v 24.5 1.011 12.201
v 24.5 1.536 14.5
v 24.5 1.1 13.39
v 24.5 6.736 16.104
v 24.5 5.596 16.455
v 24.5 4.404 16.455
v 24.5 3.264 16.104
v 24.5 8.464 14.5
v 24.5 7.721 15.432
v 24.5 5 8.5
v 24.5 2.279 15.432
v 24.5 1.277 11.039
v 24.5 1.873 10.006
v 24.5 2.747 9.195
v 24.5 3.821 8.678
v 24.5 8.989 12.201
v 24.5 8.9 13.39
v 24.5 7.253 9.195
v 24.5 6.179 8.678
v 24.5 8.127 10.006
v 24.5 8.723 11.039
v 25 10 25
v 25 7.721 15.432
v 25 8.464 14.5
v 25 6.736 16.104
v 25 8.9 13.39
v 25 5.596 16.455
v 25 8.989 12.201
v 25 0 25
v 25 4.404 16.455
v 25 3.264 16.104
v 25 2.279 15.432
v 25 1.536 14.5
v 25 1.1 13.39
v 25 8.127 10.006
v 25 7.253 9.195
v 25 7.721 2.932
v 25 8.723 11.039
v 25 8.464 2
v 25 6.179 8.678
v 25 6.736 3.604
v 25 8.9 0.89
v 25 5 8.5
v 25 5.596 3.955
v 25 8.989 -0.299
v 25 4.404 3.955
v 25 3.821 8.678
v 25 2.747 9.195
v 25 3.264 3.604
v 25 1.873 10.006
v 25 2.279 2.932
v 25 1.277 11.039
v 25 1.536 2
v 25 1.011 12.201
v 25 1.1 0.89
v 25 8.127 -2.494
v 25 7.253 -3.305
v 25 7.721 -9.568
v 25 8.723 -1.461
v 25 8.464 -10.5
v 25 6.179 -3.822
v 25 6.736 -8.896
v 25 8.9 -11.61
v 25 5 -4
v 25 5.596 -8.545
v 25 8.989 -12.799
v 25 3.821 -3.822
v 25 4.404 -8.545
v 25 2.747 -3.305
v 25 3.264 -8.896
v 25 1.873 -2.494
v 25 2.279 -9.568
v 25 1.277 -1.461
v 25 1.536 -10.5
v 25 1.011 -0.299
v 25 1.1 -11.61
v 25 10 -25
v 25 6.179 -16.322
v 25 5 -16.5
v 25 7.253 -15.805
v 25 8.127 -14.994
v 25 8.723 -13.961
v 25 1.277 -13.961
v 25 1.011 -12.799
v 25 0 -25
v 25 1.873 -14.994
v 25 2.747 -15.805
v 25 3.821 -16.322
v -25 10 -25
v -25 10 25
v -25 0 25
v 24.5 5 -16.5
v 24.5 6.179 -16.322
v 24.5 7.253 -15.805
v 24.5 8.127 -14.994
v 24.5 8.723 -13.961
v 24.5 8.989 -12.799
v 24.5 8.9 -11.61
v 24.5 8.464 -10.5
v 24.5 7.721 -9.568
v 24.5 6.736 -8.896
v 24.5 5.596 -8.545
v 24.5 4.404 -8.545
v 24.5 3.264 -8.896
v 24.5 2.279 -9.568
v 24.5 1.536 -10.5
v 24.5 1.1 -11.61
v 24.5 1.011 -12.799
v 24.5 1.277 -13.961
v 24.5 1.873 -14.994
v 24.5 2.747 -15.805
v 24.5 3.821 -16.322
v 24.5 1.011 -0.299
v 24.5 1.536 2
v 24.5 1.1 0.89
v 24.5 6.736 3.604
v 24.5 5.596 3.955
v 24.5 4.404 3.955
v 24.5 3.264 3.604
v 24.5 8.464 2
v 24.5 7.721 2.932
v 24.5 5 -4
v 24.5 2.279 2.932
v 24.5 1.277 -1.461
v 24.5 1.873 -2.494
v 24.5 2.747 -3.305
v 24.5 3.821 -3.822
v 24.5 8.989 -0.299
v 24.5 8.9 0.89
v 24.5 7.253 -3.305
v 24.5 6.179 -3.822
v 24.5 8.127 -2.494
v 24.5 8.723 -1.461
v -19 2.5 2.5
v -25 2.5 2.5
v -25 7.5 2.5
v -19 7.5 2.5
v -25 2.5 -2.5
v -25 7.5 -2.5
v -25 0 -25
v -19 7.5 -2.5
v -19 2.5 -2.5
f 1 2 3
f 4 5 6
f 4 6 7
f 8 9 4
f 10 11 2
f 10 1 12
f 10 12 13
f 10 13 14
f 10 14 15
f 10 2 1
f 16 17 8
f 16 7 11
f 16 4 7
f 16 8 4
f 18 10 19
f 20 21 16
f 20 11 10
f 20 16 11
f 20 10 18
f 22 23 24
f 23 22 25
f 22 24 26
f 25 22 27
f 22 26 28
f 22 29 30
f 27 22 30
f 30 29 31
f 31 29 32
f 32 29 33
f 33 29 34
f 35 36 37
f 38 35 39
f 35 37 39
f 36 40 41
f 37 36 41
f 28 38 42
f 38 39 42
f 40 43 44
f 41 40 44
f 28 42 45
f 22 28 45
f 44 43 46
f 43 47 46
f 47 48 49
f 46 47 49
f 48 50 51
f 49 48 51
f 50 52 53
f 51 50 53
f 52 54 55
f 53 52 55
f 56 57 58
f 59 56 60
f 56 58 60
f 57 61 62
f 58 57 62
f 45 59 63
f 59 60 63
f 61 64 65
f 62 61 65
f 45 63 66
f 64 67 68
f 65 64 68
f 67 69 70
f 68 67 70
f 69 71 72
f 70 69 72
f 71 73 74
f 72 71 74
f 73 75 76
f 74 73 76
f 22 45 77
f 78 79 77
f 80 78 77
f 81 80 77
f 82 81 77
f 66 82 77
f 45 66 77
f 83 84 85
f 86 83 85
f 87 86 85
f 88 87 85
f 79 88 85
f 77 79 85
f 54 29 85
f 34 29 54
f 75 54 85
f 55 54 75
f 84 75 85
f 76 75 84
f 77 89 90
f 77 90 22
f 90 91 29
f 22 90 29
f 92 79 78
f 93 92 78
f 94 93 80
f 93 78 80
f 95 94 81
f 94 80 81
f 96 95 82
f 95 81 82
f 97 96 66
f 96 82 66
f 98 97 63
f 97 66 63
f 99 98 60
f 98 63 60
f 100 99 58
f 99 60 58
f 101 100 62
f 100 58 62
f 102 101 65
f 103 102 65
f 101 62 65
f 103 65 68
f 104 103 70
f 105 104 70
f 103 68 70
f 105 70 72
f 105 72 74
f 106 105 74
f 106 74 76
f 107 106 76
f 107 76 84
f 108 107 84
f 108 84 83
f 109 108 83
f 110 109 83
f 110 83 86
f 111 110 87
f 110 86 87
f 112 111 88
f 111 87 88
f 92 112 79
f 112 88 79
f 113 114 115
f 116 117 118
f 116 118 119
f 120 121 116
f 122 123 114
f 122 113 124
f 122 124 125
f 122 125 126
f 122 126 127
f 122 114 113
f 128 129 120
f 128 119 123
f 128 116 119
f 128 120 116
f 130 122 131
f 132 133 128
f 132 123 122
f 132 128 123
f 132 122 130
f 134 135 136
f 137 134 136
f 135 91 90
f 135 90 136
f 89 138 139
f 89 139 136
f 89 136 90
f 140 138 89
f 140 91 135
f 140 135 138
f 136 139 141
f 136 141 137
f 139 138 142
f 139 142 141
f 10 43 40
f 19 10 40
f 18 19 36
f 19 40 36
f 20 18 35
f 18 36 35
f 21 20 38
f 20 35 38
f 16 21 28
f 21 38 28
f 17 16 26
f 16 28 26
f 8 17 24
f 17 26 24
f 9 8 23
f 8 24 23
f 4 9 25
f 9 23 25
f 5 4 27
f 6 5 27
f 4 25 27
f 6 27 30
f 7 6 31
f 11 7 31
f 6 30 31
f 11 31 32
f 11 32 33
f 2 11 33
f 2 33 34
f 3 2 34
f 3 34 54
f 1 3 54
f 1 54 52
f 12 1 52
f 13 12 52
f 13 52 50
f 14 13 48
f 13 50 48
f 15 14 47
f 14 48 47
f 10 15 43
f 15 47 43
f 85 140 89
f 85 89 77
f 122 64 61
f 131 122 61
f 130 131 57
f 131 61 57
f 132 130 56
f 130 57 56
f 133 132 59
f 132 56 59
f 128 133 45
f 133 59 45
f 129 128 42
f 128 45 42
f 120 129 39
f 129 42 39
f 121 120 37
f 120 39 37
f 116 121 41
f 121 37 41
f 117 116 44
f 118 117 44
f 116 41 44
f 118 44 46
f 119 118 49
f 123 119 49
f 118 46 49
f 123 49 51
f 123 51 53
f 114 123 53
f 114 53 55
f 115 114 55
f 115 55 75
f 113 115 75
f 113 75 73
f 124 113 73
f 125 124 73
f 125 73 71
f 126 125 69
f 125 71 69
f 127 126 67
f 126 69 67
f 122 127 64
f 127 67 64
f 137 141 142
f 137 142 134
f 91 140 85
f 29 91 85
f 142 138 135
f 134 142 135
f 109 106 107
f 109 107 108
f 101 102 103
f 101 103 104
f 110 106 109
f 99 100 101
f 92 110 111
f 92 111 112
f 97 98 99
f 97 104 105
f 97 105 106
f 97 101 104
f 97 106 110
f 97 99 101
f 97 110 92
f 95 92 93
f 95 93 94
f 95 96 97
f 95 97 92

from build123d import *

# Parameters (mm, degrees)
SKETCH1_W           = 50
SKETCH1_H           = 50
BOSS_EXTRUDE1_DEPTH = 10
SKETCH2_W           = 5
SKETCH2_H           = 5
CUT_EXTRUDE1_DEPTH  = 6
SKETCH3_R           = 4
CUT_EXTRUDE2_DEPTH  = 0.5


with BuildPart() as part:
    # Sketch1 → Boss-Extrude1 (new body)
    with BuildSketch(Plane(origin=(0, 0, 0), x_dir=(1, 0, 0), z_dir=(0, 1, 0))):
        Rectangle(SKETCH1_W, SKETCH1_H)
    extrude(amount=BOSS_EXTRUDE1_DEPTH)

    # Sketch2 → Cut-Extrude1 (cut)
    with BuildSketch(Plane.ZY.offset(25)):
        with Locations((0, 5)):
            Rectangle(SKETCH2_W, SKETCH2_H)
    extrude(amount=-CUT_EXTRUDE1_DEPTH, mode=Mode.SUBTRACT)

    # Sketch3 → Cut-Extrude2 (cut)
    with BuildSketch(Plane(origin=(25, 0, 0), x_dir=(0, 0, -1), z_dir=(1, 0, 0))):
        with Locations((-12.5, 5)):
            Circle(SKETCH3_R)
        with Locations((12.5, 5)):
            Circle(SKETCH3_R)
        with Locations((0, 5)):
            Circle(SKETCH3_R)
    extrude(amount=-CUT_EXTRUDE2_DEPTH, mode=Mode.SUBTRACT)


solid = part.part
